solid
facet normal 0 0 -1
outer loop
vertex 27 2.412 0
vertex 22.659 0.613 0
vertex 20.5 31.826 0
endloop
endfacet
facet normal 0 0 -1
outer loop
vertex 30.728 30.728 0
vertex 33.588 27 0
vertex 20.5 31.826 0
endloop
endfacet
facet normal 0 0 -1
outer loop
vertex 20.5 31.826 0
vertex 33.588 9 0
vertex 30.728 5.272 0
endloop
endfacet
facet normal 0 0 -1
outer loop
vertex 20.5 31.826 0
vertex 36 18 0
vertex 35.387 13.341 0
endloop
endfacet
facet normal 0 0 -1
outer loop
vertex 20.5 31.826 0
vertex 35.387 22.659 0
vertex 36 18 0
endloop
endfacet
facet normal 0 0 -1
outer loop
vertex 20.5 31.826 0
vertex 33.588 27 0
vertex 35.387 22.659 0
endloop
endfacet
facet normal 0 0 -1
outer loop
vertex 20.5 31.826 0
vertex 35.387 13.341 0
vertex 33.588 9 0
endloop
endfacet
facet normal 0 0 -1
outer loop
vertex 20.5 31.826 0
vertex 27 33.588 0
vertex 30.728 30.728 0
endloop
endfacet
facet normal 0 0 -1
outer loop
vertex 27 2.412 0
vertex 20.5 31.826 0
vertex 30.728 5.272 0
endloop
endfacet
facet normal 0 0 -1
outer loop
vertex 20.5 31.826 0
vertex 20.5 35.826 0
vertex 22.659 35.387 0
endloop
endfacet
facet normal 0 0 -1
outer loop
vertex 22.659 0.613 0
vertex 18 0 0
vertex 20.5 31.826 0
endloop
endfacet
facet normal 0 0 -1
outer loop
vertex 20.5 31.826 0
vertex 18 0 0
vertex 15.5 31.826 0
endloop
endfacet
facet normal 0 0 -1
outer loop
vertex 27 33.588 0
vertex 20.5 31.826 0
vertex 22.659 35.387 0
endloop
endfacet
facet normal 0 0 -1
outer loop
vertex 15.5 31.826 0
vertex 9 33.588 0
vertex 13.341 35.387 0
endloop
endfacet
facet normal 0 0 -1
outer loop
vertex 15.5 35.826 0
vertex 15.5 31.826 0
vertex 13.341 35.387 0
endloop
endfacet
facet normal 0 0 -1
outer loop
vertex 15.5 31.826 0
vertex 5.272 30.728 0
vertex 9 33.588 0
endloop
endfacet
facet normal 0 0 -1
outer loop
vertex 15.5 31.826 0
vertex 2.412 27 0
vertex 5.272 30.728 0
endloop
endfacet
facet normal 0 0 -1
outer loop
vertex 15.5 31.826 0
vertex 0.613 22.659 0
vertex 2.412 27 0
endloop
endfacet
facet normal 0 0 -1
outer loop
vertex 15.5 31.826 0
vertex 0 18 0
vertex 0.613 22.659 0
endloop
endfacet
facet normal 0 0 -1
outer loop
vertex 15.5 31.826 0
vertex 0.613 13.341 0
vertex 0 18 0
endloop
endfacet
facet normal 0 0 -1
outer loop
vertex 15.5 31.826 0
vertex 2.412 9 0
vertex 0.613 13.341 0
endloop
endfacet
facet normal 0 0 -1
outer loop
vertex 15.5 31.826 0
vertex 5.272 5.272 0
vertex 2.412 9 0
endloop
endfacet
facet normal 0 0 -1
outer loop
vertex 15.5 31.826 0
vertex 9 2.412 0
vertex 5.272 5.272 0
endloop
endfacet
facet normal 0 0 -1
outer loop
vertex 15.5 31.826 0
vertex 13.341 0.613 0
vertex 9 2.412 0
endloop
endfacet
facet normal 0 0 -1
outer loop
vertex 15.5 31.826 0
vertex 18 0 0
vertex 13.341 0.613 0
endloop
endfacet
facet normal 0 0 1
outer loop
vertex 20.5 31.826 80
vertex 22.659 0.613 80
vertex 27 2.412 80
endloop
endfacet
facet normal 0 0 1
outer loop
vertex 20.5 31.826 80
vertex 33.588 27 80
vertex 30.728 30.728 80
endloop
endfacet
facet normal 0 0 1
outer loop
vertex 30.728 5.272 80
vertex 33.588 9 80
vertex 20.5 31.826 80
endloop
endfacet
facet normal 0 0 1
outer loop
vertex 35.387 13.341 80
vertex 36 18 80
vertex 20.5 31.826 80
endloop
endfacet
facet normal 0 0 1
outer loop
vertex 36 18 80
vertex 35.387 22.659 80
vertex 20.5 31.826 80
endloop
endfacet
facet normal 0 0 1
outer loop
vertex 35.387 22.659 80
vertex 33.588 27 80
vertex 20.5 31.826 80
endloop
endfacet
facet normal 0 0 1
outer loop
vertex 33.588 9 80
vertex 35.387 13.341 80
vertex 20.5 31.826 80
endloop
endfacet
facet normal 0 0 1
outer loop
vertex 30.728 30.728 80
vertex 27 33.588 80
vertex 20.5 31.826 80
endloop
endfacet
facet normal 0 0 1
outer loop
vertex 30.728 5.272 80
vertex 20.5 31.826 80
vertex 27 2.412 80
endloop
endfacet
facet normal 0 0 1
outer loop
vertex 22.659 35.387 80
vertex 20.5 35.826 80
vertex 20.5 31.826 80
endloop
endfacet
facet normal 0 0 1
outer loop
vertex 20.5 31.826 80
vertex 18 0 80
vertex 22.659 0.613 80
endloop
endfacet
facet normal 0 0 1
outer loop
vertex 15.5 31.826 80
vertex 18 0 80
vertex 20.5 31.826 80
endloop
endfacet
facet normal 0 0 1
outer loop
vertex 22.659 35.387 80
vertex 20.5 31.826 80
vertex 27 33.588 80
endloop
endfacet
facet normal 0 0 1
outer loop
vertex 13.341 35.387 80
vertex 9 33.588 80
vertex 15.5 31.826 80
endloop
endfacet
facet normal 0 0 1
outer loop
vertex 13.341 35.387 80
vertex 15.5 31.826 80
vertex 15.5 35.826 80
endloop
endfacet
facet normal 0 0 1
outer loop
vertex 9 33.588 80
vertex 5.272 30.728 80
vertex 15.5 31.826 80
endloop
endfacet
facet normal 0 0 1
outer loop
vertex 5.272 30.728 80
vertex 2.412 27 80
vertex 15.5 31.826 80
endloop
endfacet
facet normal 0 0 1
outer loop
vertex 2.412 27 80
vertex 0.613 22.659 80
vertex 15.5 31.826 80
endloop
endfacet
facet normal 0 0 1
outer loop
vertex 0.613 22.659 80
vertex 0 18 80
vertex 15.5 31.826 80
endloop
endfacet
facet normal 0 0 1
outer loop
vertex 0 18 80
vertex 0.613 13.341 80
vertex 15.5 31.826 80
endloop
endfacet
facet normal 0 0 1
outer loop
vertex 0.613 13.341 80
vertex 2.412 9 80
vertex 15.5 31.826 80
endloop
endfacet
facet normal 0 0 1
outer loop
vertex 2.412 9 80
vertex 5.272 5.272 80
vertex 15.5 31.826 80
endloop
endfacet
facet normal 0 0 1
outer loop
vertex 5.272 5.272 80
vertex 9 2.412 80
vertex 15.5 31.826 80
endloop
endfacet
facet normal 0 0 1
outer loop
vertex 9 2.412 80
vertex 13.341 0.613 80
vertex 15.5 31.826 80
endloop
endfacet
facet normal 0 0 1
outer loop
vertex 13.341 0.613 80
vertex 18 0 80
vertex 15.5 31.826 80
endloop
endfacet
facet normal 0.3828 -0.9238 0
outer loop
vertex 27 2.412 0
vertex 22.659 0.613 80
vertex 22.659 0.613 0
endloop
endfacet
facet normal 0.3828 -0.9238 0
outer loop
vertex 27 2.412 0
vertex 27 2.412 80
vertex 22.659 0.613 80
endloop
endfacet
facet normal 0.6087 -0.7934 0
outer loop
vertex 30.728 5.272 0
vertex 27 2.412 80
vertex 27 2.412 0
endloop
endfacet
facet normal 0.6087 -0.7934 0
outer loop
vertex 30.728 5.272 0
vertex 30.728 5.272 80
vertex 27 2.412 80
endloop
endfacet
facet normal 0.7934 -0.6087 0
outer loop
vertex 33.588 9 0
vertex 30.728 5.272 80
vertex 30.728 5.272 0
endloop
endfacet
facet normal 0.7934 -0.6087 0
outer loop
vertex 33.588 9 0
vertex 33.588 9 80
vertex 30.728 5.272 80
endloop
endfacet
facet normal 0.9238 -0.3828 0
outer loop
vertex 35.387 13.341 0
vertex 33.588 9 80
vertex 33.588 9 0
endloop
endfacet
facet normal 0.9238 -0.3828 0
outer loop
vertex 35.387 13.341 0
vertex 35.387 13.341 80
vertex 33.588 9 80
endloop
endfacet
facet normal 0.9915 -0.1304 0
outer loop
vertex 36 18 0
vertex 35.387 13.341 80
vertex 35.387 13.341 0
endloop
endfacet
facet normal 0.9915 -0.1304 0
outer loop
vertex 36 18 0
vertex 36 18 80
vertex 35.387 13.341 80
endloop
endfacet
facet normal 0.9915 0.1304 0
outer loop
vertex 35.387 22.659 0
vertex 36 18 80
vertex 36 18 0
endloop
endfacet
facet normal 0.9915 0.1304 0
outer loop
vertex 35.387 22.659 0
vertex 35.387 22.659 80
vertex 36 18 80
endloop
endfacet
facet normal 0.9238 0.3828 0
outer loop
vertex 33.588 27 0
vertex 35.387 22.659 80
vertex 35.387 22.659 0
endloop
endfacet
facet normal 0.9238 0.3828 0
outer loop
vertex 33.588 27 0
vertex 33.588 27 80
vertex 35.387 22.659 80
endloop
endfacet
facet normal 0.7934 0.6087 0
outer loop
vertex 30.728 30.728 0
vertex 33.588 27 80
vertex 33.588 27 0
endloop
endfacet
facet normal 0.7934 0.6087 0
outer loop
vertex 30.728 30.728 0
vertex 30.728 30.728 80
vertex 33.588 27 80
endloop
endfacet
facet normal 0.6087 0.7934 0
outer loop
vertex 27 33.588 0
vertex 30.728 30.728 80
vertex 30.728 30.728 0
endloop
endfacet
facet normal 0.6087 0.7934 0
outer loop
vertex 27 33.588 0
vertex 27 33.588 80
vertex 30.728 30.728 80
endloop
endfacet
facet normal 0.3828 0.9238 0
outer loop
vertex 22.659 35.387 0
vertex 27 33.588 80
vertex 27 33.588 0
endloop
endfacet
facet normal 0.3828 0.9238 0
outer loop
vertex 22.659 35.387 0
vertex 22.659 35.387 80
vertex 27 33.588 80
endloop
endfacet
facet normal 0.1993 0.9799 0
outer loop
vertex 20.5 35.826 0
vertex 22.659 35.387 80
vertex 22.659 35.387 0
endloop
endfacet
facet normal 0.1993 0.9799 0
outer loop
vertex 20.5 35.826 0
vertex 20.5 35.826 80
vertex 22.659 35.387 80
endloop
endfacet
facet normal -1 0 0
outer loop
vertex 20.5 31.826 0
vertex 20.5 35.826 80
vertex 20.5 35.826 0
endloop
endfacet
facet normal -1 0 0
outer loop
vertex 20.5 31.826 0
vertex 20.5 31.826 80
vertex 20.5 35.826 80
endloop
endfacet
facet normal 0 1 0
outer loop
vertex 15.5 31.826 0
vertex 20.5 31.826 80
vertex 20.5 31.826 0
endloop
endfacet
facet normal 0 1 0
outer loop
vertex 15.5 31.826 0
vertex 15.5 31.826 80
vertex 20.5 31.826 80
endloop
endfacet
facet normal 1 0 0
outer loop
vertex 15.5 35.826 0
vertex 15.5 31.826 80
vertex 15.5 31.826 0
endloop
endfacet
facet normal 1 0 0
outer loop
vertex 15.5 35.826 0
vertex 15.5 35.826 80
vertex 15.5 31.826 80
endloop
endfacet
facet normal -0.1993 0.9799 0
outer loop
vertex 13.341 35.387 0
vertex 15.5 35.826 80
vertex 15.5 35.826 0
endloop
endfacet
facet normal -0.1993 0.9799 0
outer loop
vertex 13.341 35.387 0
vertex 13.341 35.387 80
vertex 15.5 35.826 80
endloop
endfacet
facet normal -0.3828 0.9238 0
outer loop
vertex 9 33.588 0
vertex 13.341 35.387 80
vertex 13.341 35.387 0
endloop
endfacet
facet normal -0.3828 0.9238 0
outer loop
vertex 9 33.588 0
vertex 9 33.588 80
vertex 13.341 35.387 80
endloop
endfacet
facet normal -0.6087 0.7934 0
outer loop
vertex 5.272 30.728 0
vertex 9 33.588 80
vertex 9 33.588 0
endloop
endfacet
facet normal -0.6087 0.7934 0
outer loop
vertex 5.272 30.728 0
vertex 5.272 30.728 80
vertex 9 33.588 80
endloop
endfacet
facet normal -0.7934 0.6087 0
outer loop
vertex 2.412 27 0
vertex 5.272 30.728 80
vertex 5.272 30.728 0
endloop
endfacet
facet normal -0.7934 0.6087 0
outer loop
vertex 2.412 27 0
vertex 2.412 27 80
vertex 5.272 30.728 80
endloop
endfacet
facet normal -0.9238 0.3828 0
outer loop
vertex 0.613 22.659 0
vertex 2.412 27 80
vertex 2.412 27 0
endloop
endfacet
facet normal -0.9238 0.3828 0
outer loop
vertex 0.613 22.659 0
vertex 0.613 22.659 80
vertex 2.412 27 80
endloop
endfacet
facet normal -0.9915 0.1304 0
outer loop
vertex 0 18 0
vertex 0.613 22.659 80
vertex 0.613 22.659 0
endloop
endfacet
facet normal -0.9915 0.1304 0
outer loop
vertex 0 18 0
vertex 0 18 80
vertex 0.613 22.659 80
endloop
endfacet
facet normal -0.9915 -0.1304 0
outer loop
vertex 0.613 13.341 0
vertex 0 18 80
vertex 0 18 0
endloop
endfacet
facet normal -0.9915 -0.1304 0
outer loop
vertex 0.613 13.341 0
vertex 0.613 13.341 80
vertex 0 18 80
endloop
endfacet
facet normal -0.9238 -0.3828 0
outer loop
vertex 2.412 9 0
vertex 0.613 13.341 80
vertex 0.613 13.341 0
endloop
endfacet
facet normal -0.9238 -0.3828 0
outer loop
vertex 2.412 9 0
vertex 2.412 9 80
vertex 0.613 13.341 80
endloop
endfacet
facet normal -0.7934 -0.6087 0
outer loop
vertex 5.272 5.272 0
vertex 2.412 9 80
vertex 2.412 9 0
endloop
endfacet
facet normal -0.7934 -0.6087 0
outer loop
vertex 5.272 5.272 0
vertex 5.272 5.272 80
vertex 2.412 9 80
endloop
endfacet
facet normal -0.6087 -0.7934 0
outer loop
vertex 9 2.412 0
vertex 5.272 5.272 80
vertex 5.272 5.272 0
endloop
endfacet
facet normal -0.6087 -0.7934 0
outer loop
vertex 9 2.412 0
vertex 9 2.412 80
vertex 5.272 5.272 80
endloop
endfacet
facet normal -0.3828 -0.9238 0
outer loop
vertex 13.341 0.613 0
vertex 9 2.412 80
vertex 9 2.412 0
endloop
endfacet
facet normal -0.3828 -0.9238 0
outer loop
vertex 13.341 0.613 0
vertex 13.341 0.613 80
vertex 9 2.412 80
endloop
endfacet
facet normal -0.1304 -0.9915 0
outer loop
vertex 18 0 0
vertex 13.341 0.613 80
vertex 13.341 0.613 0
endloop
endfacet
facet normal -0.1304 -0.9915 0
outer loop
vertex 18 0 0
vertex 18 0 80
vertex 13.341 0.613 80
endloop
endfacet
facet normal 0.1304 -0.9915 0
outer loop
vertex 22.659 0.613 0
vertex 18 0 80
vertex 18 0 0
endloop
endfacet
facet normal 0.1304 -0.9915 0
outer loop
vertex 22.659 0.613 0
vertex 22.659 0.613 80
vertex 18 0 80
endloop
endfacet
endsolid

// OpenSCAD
$fn = 32;

// ----------------------------------------------------------------------
// Keyway shaft: d36 shaft, key 5 x 4 mm
// ----------------------------------------------------------------------

// --- parameters (mm) ---
shaft_r = 18;             // shaft radius
key_w = 5;                // keyway width
key_d = 4;                // keyway depth below the surface line
plate_t = 80;             // shaft length, Z (extrusion height)

shaft_d = 2 * shaft_r;  // shaft diameter
circle_step = 15;  // polygon sampling step, degrees

profile = [[13.341, 35.387], [9, 33.588], [5.272, 30.728], [2.412, 27], [0.613, 22.659], [0, 18], [0.613, 13.341], [2.412, 9], [5.272, 5.272], [9, 2.412], [13.341, 0.613], [18, 0], [22.659, 0.613], [27, 2.412], [30.728, 5.272], [33.588, 9], [35.387, 13.341], [36, 18], [35.387, 22.659], [33.588, 27], [30.728, 30.728], [27, 33.588], [22.659, 35.387], [20.5, 35.826], [20.5, 31.826], [15.5, 31.826], [15.5, 35.826]];  // primary outline, 27 points, counter clockwise

// --- the one profile operation ---
linear_extrude(height = plate_t) polygon(points = profile);
